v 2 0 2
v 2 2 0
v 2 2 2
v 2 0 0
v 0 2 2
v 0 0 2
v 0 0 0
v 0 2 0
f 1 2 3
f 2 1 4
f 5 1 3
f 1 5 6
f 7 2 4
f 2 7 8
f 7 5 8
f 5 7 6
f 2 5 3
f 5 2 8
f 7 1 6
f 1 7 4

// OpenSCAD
apple_outline();

module apple_outline() {
	difference() {
		minkowski() {
			linear_extrude(1) apple();
			cube(2);
		}
		translate([1,1,-1]) linear_extrude(4) apple();
	}
}

module apple() {
import("/Users/rmd/Documents/apple bar sinister.dxf");
}
